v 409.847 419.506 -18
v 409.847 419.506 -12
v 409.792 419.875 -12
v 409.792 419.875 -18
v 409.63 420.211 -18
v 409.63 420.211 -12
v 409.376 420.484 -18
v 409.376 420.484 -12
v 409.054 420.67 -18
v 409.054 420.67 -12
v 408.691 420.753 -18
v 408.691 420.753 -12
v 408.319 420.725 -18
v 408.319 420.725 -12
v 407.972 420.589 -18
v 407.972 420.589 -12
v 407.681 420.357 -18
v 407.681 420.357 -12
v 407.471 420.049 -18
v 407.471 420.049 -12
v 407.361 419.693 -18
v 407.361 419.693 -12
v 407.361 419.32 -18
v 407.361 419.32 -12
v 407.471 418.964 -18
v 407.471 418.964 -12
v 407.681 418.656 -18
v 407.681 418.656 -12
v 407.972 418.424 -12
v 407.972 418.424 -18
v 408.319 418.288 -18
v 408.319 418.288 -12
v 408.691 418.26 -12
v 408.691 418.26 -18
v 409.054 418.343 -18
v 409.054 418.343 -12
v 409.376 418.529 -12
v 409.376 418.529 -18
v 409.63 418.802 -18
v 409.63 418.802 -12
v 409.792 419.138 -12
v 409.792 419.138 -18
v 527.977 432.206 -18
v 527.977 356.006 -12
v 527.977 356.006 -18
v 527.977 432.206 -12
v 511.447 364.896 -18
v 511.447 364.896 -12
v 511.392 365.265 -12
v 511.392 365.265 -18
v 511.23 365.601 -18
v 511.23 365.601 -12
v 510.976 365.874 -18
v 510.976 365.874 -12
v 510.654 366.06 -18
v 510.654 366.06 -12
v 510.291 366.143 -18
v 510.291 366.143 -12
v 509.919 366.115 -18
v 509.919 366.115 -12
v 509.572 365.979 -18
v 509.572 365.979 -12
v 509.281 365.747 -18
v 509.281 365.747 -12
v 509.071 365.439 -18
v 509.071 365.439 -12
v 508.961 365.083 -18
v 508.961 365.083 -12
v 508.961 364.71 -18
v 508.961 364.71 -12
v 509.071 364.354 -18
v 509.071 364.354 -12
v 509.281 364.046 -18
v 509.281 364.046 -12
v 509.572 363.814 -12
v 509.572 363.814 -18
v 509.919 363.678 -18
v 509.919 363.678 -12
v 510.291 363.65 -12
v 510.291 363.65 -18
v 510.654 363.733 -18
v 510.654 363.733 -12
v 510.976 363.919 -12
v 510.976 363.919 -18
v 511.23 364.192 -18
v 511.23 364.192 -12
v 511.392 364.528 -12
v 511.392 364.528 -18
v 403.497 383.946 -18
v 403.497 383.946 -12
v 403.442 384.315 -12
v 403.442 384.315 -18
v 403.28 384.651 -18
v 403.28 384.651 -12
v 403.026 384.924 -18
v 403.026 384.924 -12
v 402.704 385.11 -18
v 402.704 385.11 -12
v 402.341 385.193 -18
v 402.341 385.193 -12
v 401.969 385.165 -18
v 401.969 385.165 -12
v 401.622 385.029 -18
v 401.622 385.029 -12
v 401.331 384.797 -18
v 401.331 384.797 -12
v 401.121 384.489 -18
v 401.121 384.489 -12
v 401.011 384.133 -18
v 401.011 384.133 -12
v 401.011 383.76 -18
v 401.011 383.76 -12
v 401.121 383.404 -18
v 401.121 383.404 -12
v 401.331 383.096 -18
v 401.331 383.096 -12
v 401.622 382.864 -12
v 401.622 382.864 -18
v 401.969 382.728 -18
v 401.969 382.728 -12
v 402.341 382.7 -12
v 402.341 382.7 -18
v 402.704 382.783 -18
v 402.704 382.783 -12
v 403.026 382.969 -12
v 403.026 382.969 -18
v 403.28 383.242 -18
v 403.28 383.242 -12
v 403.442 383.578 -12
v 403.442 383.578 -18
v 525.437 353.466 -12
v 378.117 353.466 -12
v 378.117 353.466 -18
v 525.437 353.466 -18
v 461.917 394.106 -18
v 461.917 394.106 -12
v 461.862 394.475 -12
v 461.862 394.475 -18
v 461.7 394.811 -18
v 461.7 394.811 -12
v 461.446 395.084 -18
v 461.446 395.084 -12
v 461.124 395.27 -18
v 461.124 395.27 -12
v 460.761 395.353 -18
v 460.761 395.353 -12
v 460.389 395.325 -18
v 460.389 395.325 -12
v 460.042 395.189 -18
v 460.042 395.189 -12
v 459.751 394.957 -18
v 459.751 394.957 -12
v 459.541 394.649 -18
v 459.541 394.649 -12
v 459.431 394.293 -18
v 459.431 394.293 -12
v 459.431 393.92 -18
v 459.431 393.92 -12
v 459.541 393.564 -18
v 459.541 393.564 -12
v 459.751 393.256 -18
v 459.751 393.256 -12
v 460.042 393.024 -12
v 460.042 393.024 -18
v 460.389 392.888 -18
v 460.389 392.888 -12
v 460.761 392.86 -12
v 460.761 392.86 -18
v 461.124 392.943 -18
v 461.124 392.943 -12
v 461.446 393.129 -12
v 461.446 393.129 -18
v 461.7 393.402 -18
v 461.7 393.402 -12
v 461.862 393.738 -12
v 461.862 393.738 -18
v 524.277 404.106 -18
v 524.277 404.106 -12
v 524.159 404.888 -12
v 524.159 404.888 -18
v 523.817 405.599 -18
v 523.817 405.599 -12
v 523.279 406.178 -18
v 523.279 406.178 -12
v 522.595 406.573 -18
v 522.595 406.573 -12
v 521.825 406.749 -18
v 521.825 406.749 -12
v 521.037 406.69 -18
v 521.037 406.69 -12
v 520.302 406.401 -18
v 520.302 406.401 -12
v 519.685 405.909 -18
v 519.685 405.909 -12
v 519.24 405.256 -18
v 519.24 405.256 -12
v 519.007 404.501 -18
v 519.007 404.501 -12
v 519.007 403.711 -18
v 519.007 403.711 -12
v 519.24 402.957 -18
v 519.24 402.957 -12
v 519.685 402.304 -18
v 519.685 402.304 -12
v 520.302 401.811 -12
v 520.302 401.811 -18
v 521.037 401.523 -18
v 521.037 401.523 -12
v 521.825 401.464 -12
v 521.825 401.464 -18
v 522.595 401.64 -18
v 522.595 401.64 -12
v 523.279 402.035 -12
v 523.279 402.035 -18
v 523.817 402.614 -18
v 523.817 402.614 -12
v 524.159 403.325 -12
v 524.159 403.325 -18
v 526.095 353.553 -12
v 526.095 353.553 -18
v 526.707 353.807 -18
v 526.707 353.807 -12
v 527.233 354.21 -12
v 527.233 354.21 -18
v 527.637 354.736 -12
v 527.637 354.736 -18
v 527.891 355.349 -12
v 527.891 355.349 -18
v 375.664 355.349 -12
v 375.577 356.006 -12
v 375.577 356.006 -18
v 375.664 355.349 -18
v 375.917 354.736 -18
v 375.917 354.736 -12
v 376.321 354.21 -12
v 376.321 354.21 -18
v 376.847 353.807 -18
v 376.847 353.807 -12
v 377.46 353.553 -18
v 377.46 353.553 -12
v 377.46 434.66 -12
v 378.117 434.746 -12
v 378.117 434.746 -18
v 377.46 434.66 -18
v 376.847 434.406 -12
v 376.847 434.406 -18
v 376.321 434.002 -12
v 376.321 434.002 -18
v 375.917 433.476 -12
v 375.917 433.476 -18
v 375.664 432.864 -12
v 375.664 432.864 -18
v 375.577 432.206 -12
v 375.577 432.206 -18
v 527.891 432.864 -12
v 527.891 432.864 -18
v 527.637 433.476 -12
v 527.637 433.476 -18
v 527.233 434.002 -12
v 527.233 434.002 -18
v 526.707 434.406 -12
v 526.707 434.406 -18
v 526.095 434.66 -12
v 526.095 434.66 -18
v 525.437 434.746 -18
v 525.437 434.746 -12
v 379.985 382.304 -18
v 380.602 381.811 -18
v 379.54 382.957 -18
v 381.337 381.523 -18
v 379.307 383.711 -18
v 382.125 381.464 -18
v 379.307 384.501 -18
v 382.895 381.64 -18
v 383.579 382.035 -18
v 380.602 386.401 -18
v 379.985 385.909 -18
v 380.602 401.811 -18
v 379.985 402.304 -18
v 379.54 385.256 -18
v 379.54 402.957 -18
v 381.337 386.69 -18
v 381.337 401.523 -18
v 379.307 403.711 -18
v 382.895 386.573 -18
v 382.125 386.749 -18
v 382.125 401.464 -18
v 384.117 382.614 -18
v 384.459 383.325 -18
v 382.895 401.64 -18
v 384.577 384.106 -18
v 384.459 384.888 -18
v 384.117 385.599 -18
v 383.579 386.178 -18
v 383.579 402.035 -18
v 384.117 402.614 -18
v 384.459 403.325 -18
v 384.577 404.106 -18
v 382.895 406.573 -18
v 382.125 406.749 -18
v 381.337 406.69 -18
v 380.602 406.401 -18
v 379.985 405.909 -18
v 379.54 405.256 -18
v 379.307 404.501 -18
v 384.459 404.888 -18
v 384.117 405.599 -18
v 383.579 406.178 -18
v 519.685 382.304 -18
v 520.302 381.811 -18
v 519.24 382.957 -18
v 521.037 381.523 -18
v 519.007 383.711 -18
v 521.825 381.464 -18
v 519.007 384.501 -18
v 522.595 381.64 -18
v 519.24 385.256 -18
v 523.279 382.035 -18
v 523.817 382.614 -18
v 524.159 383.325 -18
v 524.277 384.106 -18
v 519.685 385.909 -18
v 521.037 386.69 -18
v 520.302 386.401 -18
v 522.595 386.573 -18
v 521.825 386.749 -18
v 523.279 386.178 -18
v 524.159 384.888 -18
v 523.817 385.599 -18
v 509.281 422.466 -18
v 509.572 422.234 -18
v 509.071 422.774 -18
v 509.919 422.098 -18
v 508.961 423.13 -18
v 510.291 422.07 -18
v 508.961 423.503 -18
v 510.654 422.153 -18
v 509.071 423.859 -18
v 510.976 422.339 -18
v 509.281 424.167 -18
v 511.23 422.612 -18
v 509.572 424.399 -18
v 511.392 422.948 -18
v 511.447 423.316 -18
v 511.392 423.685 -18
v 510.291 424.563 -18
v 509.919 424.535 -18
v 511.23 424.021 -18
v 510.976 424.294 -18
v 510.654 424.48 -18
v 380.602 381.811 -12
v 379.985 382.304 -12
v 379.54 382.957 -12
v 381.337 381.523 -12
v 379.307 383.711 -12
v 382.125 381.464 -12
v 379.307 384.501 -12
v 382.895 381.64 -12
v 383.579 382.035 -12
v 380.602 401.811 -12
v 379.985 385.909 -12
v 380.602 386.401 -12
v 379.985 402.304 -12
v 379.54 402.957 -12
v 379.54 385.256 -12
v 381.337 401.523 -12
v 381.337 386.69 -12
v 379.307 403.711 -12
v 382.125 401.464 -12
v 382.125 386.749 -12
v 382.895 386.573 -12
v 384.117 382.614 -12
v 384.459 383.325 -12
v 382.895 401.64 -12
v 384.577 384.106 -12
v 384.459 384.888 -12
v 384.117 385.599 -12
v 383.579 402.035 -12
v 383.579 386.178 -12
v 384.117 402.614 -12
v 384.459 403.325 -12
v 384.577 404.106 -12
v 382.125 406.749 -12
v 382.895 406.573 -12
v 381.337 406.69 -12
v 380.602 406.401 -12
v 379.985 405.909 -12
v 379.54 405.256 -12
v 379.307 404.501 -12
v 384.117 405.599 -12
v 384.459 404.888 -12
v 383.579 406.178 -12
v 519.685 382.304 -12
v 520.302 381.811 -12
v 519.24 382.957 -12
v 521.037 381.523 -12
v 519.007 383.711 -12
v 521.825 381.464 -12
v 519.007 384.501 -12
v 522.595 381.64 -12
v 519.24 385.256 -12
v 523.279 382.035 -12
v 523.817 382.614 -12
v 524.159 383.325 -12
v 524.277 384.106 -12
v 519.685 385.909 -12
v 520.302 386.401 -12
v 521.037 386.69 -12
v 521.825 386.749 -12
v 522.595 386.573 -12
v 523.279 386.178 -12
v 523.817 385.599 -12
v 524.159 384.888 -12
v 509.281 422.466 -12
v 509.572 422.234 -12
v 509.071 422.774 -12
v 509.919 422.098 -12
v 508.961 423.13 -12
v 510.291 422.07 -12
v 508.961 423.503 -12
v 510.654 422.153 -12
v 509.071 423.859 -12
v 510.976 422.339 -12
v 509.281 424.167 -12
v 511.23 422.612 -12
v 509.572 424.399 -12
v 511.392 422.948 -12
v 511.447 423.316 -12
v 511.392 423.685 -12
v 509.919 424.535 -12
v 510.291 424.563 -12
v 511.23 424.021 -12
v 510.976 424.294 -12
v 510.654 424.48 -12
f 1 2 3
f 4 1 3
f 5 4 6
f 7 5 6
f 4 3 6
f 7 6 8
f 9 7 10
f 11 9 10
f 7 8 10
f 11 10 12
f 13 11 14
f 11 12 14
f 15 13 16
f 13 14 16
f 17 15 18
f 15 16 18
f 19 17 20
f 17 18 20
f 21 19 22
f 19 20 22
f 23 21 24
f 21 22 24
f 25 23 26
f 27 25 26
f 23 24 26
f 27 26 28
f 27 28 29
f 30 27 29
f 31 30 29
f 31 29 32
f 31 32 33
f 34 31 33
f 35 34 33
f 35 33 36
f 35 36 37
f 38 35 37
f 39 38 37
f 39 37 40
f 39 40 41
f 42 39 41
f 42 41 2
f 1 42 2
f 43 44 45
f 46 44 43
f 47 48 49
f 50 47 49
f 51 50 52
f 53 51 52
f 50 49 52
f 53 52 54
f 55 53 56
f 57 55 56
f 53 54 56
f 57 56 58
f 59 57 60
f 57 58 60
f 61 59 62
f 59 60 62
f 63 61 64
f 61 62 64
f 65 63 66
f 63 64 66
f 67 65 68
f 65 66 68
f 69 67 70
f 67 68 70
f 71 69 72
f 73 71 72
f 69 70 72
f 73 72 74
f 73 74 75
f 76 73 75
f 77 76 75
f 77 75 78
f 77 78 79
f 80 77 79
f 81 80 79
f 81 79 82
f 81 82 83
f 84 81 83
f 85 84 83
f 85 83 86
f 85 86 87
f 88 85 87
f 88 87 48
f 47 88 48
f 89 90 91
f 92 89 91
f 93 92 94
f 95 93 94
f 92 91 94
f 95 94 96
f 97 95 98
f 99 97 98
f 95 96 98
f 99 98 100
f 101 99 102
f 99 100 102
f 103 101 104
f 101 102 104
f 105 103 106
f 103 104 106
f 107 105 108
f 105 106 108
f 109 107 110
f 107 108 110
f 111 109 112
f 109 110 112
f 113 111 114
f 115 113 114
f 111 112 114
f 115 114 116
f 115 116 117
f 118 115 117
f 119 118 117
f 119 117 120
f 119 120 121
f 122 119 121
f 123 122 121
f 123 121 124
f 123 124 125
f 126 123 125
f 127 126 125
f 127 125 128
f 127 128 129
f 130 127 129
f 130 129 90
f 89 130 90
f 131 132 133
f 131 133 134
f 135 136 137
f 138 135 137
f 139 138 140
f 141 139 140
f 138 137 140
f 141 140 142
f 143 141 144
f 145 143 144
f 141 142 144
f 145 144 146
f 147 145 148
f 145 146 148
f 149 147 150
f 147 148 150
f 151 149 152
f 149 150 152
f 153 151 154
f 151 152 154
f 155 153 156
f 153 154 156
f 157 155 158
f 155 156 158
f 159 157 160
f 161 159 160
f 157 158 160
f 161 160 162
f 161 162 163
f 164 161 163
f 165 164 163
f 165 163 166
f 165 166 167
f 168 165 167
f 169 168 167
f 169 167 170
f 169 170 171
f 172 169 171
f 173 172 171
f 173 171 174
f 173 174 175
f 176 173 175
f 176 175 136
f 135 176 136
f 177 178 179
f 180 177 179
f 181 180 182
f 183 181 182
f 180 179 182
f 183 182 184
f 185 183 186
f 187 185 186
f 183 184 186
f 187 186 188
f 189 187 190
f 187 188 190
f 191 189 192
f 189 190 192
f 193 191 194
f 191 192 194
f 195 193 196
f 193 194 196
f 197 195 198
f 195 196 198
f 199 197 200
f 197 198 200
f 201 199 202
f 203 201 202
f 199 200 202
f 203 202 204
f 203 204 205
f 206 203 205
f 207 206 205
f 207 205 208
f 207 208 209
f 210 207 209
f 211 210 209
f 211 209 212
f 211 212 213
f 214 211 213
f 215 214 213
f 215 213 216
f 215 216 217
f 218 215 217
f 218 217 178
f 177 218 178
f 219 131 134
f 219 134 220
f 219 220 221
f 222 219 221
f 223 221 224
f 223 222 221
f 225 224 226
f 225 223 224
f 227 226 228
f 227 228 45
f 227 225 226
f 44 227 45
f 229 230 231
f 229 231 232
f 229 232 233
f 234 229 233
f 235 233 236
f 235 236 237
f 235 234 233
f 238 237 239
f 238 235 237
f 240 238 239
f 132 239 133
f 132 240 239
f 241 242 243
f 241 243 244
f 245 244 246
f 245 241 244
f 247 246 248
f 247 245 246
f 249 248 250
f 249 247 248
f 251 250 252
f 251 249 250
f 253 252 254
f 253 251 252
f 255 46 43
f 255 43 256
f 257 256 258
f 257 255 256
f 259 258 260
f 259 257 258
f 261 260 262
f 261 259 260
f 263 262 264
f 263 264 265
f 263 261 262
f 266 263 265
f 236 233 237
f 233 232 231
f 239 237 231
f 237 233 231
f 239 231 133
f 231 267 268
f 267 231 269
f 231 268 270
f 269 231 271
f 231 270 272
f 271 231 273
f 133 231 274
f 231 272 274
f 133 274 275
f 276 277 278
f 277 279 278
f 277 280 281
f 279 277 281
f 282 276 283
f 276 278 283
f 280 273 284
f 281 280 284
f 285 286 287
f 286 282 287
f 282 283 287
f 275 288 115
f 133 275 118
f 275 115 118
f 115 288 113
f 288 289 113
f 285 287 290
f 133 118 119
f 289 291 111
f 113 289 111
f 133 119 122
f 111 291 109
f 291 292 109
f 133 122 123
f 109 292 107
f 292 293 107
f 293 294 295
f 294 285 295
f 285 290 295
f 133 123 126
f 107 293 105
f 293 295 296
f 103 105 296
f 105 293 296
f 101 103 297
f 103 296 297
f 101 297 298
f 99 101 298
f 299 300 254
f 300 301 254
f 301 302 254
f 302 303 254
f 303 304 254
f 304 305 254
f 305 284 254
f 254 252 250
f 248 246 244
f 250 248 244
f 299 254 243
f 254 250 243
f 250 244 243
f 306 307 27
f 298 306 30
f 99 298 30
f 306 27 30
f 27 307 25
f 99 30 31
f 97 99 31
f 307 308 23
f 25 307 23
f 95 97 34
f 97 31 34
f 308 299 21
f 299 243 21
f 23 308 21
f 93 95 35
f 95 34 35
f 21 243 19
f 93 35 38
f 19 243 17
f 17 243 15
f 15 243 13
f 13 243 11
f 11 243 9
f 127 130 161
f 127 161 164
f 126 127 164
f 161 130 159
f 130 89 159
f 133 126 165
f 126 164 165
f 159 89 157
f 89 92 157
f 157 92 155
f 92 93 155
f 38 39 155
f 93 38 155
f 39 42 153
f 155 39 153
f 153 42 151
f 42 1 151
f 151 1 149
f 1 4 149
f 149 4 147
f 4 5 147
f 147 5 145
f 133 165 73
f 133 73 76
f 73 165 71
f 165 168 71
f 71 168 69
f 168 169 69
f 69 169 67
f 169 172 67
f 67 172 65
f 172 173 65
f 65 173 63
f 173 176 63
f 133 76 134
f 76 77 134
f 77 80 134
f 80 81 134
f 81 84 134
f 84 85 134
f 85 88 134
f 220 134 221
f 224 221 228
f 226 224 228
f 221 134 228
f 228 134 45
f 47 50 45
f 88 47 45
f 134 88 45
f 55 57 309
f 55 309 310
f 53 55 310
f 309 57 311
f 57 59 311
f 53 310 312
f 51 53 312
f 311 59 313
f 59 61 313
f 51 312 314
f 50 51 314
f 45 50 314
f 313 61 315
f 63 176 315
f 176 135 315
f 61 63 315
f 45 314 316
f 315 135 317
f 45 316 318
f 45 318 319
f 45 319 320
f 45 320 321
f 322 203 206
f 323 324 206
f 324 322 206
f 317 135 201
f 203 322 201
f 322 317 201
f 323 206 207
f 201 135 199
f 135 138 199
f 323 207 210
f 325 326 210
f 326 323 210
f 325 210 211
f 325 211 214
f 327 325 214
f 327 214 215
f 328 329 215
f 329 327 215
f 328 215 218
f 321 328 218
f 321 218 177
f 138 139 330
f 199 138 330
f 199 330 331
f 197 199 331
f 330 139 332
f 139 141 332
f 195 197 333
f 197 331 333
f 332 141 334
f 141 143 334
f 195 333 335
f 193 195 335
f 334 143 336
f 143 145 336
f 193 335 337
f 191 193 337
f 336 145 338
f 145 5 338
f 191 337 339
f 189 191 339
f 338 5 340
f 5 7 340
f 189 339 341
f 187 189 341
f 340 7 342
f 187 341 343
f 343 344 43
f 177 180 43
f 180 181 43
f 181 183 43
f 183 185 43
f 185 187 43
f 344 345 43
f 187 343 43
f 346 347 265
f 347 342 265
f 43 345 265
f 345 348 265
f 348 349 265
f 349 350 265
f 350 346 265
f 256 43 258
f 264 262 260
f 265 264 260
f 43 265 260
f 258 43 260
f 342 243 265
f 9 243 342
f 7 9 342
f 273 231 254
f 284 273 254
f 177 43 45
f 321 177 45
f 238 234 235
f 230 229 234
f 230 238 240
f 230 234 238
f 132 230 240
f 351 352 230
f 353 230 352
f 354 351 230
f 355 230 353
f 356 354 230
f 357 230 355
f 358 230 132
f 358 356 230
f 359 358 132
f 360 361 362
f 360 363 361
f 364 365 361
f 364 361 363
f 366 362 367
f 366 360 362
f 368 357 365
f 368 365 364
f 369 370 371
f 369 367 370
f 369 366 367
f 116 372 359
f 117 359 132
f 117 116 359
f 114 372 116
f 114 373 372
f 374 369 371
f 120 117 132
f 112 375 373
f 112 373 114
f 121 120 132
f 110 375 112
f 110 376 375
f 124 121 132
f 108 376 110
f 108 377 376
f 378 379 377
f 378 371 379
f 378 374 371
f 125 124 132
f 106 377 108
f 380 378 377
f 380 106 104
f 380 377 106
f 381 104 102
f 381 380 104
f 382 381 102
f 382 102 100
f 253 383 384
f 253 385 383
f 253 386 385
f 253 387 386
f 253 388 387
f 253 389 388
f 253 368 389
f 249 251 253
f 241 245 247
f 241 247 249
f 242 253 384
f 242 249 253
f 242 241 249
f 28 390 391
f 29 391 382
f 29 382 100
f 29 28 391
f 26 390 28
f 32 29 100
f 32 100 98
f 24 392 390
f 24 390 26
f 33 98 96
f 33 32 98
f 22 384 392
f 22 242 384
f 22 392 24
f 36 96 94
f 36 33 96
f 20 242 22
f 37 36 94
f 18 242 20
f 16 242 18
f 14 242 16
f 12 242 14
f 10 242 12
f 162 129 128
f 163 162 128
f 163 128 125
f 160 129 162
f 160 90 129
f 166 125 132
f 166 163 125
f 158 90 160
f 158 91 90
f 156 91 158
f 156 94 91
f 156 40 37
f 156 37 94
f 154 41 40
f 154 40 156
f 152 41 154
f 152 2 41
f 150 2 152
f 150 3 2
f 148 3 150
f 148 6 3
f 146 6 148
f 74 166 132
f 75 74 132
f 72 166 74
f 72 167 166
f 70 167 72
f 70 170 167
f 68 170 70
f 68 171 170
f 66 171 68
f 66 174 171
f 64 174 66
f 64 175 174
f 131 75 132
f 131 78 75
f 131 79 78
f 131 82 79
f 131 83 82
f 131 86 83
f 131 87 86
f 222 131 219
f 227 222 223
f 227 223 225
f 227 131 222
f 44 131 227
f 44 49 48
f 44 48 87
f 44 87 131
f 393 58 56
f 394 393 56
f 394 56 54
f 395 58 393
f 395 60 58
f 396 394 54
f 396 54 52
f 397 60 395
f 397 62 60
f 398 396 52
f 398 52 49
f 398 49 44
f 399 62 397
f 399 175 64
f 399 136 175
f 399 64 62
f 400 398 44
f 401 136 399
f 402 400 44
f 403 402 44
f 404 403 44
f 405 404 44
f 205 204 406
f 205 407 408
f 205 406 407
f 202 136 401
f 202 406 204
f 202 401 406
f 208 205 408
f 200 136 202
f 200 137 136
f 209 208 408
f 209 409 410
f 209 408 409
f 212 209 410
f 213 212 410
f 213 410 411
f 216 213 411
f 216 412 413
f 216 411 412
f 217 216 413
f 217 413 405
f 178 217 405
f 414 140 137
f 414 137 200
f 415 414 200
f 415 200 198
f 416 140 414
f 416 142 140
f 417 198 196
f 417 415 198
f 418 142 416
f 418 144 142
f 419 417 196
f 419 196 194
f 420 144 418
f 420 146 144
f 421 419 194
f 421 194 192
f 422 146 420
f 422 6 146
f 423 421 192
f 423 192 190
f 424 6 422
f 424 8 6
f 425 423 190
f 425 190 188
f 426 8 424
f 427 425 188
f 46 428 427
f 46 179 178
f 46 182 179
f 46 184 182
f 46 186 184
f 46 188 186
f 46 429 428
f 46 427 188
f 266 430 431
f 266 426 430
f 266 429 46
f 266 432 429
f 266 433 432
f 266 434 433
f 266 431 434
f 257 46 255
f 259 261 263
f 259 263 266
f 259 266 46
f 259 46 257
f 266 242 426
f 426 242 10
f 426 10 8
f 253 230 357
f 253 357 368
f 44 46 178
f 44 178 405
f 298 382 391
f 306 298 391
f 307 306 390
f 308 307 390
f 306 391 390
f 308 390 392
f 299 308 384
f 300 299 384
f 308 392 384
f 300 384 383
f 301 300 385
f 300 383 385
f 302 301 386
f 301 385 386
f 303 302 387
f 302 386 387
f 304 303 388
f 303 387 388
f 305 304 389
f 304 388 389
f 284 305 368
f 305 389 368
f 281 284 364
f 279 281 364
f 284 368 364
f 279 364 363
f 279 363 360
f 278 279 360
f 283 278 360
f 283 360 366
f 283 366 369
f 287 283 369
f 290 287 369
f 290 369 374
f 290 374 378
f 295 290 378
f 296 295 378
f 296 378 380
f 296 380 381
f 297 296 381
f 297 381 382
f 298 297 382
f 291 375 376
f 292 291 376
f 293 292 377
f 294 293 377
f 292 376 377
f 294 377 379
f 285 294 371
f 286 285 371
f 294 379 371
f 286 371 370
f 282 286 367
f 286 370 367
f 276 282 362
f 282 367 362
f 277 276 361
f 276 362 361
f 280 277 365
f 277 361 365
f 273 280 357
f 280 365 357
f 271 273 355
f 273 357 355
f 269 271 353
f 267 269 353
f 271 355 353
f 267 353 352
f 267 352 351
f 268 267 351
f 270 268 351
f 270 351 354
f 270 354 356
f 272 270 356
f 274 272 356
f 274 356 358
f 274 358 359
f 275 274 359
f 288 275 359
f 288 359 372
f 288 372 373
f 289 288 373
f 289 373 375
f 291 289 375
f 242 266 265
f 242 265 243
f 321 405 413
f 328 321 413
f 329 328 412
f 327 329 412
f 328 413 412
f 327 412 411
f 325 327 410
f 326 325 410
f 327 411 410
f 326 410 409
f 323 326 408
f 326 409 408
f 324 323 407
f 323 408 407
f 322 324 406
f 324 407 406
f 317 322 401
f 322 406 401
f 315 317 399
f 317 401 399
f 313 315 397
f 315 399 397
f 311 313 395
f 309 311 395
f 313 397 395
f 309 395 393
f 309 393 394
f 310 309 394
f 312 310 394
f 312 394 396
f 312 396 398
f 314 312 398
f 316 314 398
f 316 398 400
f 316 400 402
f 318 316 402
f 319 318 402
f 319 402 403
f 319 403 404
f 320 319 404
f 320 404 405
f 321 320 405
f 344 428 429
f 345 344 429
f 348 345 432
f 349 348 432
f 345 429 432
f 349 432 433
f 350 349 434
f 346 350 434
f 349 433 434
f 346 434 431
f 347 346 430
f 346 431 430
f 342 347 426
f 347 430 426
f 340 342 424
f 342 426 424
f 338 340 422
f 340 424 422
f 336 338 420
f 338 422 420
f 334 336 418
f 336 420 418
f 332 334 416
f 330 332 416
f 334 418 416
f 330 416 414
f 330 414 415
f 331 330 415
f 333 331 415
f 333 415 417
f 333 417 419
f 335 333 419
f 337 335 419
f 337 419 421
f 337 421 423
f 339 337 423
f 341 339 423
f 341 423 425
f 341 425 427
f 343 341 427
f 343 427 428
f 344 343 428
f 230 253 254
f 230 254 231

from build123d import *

# Parameters (mm, degrees)
BOSS_EXTRUDE1_DEPTH   = 6
M5_CLEARANCE_HOLE1_D  = 5.3
M3X0_5_TAPPED_HOLE1_D = 2.5


with BuildPart() as part:
    # Sketch1 → Boss-Extrude1 (new body)
    with BuildSketch(Plane(origin=(0, 0, -11.999999876), x_dir=(-1, 0, 0), z_dir=(0, 0, -1))):
        with BuildLine():
            Line((-525.4371, 434.7464), (-378.1171, 434.7464))
            ThreePointArc((-378.1171, 434.7464), (-376.321048776, 434.002451224), (-375.5771, 432.2064))
            Line((-375.5771, 432.2064), (-375.5771, 356.0064))
            ThreePointArc((-375.5771, 356.0064), (-376.321048776, 354.210348776), (-378.1171, 353.4664))
            Line((-378.1171, 353.4664), (-525.4371, 353.4664))
            ThreePointArc((-525.4371, 353.4664), (-527.233151224, 354.210348776), (-527.9771, 356.0064))
            Line((-527.9771, 356.0064), (-527.9771, 432.2064))
            ThreePointArc((-527.9771, 432.2064), (-527.233151224, 434.002451224), (-525.4371, 434.7464))
        make_face()
    extrude(amount=BOSS_EXTRUDE1_DEPTH)

    # M5 Clearance Hole1 (through all)
    with Locations(Plane(origin=(0, 0, -17.999999876), x_dir=(-1, 0, 0), z_dir=(0, 0, -1))):
        with Locations((-521.6271, 404.106399939), (-521.6271, 384.106400061), (-381.9271, 384.106400061), (-381.9271, 404.106399939)):
            Hole(M5_CLEARANCE_HOLE1_D / 2)

    # M3x0.5 Tapped Hole1 (through all)
    with Locations(Plane(origin=(0, 0, -17.999999876), x_dir=(-1, 0, 0), z_dir=(0, 0, -1))):
        with Locations((-510.1971, 423.3164), (-408.5971, 419.5064), (-460.6671, 394.1064), (-402.2471, 383.9464), (-510.1971, 364.8964)):
            Hole(M3X0_5_TAPPED_HOLE1_D / 2)


solid = part.part
